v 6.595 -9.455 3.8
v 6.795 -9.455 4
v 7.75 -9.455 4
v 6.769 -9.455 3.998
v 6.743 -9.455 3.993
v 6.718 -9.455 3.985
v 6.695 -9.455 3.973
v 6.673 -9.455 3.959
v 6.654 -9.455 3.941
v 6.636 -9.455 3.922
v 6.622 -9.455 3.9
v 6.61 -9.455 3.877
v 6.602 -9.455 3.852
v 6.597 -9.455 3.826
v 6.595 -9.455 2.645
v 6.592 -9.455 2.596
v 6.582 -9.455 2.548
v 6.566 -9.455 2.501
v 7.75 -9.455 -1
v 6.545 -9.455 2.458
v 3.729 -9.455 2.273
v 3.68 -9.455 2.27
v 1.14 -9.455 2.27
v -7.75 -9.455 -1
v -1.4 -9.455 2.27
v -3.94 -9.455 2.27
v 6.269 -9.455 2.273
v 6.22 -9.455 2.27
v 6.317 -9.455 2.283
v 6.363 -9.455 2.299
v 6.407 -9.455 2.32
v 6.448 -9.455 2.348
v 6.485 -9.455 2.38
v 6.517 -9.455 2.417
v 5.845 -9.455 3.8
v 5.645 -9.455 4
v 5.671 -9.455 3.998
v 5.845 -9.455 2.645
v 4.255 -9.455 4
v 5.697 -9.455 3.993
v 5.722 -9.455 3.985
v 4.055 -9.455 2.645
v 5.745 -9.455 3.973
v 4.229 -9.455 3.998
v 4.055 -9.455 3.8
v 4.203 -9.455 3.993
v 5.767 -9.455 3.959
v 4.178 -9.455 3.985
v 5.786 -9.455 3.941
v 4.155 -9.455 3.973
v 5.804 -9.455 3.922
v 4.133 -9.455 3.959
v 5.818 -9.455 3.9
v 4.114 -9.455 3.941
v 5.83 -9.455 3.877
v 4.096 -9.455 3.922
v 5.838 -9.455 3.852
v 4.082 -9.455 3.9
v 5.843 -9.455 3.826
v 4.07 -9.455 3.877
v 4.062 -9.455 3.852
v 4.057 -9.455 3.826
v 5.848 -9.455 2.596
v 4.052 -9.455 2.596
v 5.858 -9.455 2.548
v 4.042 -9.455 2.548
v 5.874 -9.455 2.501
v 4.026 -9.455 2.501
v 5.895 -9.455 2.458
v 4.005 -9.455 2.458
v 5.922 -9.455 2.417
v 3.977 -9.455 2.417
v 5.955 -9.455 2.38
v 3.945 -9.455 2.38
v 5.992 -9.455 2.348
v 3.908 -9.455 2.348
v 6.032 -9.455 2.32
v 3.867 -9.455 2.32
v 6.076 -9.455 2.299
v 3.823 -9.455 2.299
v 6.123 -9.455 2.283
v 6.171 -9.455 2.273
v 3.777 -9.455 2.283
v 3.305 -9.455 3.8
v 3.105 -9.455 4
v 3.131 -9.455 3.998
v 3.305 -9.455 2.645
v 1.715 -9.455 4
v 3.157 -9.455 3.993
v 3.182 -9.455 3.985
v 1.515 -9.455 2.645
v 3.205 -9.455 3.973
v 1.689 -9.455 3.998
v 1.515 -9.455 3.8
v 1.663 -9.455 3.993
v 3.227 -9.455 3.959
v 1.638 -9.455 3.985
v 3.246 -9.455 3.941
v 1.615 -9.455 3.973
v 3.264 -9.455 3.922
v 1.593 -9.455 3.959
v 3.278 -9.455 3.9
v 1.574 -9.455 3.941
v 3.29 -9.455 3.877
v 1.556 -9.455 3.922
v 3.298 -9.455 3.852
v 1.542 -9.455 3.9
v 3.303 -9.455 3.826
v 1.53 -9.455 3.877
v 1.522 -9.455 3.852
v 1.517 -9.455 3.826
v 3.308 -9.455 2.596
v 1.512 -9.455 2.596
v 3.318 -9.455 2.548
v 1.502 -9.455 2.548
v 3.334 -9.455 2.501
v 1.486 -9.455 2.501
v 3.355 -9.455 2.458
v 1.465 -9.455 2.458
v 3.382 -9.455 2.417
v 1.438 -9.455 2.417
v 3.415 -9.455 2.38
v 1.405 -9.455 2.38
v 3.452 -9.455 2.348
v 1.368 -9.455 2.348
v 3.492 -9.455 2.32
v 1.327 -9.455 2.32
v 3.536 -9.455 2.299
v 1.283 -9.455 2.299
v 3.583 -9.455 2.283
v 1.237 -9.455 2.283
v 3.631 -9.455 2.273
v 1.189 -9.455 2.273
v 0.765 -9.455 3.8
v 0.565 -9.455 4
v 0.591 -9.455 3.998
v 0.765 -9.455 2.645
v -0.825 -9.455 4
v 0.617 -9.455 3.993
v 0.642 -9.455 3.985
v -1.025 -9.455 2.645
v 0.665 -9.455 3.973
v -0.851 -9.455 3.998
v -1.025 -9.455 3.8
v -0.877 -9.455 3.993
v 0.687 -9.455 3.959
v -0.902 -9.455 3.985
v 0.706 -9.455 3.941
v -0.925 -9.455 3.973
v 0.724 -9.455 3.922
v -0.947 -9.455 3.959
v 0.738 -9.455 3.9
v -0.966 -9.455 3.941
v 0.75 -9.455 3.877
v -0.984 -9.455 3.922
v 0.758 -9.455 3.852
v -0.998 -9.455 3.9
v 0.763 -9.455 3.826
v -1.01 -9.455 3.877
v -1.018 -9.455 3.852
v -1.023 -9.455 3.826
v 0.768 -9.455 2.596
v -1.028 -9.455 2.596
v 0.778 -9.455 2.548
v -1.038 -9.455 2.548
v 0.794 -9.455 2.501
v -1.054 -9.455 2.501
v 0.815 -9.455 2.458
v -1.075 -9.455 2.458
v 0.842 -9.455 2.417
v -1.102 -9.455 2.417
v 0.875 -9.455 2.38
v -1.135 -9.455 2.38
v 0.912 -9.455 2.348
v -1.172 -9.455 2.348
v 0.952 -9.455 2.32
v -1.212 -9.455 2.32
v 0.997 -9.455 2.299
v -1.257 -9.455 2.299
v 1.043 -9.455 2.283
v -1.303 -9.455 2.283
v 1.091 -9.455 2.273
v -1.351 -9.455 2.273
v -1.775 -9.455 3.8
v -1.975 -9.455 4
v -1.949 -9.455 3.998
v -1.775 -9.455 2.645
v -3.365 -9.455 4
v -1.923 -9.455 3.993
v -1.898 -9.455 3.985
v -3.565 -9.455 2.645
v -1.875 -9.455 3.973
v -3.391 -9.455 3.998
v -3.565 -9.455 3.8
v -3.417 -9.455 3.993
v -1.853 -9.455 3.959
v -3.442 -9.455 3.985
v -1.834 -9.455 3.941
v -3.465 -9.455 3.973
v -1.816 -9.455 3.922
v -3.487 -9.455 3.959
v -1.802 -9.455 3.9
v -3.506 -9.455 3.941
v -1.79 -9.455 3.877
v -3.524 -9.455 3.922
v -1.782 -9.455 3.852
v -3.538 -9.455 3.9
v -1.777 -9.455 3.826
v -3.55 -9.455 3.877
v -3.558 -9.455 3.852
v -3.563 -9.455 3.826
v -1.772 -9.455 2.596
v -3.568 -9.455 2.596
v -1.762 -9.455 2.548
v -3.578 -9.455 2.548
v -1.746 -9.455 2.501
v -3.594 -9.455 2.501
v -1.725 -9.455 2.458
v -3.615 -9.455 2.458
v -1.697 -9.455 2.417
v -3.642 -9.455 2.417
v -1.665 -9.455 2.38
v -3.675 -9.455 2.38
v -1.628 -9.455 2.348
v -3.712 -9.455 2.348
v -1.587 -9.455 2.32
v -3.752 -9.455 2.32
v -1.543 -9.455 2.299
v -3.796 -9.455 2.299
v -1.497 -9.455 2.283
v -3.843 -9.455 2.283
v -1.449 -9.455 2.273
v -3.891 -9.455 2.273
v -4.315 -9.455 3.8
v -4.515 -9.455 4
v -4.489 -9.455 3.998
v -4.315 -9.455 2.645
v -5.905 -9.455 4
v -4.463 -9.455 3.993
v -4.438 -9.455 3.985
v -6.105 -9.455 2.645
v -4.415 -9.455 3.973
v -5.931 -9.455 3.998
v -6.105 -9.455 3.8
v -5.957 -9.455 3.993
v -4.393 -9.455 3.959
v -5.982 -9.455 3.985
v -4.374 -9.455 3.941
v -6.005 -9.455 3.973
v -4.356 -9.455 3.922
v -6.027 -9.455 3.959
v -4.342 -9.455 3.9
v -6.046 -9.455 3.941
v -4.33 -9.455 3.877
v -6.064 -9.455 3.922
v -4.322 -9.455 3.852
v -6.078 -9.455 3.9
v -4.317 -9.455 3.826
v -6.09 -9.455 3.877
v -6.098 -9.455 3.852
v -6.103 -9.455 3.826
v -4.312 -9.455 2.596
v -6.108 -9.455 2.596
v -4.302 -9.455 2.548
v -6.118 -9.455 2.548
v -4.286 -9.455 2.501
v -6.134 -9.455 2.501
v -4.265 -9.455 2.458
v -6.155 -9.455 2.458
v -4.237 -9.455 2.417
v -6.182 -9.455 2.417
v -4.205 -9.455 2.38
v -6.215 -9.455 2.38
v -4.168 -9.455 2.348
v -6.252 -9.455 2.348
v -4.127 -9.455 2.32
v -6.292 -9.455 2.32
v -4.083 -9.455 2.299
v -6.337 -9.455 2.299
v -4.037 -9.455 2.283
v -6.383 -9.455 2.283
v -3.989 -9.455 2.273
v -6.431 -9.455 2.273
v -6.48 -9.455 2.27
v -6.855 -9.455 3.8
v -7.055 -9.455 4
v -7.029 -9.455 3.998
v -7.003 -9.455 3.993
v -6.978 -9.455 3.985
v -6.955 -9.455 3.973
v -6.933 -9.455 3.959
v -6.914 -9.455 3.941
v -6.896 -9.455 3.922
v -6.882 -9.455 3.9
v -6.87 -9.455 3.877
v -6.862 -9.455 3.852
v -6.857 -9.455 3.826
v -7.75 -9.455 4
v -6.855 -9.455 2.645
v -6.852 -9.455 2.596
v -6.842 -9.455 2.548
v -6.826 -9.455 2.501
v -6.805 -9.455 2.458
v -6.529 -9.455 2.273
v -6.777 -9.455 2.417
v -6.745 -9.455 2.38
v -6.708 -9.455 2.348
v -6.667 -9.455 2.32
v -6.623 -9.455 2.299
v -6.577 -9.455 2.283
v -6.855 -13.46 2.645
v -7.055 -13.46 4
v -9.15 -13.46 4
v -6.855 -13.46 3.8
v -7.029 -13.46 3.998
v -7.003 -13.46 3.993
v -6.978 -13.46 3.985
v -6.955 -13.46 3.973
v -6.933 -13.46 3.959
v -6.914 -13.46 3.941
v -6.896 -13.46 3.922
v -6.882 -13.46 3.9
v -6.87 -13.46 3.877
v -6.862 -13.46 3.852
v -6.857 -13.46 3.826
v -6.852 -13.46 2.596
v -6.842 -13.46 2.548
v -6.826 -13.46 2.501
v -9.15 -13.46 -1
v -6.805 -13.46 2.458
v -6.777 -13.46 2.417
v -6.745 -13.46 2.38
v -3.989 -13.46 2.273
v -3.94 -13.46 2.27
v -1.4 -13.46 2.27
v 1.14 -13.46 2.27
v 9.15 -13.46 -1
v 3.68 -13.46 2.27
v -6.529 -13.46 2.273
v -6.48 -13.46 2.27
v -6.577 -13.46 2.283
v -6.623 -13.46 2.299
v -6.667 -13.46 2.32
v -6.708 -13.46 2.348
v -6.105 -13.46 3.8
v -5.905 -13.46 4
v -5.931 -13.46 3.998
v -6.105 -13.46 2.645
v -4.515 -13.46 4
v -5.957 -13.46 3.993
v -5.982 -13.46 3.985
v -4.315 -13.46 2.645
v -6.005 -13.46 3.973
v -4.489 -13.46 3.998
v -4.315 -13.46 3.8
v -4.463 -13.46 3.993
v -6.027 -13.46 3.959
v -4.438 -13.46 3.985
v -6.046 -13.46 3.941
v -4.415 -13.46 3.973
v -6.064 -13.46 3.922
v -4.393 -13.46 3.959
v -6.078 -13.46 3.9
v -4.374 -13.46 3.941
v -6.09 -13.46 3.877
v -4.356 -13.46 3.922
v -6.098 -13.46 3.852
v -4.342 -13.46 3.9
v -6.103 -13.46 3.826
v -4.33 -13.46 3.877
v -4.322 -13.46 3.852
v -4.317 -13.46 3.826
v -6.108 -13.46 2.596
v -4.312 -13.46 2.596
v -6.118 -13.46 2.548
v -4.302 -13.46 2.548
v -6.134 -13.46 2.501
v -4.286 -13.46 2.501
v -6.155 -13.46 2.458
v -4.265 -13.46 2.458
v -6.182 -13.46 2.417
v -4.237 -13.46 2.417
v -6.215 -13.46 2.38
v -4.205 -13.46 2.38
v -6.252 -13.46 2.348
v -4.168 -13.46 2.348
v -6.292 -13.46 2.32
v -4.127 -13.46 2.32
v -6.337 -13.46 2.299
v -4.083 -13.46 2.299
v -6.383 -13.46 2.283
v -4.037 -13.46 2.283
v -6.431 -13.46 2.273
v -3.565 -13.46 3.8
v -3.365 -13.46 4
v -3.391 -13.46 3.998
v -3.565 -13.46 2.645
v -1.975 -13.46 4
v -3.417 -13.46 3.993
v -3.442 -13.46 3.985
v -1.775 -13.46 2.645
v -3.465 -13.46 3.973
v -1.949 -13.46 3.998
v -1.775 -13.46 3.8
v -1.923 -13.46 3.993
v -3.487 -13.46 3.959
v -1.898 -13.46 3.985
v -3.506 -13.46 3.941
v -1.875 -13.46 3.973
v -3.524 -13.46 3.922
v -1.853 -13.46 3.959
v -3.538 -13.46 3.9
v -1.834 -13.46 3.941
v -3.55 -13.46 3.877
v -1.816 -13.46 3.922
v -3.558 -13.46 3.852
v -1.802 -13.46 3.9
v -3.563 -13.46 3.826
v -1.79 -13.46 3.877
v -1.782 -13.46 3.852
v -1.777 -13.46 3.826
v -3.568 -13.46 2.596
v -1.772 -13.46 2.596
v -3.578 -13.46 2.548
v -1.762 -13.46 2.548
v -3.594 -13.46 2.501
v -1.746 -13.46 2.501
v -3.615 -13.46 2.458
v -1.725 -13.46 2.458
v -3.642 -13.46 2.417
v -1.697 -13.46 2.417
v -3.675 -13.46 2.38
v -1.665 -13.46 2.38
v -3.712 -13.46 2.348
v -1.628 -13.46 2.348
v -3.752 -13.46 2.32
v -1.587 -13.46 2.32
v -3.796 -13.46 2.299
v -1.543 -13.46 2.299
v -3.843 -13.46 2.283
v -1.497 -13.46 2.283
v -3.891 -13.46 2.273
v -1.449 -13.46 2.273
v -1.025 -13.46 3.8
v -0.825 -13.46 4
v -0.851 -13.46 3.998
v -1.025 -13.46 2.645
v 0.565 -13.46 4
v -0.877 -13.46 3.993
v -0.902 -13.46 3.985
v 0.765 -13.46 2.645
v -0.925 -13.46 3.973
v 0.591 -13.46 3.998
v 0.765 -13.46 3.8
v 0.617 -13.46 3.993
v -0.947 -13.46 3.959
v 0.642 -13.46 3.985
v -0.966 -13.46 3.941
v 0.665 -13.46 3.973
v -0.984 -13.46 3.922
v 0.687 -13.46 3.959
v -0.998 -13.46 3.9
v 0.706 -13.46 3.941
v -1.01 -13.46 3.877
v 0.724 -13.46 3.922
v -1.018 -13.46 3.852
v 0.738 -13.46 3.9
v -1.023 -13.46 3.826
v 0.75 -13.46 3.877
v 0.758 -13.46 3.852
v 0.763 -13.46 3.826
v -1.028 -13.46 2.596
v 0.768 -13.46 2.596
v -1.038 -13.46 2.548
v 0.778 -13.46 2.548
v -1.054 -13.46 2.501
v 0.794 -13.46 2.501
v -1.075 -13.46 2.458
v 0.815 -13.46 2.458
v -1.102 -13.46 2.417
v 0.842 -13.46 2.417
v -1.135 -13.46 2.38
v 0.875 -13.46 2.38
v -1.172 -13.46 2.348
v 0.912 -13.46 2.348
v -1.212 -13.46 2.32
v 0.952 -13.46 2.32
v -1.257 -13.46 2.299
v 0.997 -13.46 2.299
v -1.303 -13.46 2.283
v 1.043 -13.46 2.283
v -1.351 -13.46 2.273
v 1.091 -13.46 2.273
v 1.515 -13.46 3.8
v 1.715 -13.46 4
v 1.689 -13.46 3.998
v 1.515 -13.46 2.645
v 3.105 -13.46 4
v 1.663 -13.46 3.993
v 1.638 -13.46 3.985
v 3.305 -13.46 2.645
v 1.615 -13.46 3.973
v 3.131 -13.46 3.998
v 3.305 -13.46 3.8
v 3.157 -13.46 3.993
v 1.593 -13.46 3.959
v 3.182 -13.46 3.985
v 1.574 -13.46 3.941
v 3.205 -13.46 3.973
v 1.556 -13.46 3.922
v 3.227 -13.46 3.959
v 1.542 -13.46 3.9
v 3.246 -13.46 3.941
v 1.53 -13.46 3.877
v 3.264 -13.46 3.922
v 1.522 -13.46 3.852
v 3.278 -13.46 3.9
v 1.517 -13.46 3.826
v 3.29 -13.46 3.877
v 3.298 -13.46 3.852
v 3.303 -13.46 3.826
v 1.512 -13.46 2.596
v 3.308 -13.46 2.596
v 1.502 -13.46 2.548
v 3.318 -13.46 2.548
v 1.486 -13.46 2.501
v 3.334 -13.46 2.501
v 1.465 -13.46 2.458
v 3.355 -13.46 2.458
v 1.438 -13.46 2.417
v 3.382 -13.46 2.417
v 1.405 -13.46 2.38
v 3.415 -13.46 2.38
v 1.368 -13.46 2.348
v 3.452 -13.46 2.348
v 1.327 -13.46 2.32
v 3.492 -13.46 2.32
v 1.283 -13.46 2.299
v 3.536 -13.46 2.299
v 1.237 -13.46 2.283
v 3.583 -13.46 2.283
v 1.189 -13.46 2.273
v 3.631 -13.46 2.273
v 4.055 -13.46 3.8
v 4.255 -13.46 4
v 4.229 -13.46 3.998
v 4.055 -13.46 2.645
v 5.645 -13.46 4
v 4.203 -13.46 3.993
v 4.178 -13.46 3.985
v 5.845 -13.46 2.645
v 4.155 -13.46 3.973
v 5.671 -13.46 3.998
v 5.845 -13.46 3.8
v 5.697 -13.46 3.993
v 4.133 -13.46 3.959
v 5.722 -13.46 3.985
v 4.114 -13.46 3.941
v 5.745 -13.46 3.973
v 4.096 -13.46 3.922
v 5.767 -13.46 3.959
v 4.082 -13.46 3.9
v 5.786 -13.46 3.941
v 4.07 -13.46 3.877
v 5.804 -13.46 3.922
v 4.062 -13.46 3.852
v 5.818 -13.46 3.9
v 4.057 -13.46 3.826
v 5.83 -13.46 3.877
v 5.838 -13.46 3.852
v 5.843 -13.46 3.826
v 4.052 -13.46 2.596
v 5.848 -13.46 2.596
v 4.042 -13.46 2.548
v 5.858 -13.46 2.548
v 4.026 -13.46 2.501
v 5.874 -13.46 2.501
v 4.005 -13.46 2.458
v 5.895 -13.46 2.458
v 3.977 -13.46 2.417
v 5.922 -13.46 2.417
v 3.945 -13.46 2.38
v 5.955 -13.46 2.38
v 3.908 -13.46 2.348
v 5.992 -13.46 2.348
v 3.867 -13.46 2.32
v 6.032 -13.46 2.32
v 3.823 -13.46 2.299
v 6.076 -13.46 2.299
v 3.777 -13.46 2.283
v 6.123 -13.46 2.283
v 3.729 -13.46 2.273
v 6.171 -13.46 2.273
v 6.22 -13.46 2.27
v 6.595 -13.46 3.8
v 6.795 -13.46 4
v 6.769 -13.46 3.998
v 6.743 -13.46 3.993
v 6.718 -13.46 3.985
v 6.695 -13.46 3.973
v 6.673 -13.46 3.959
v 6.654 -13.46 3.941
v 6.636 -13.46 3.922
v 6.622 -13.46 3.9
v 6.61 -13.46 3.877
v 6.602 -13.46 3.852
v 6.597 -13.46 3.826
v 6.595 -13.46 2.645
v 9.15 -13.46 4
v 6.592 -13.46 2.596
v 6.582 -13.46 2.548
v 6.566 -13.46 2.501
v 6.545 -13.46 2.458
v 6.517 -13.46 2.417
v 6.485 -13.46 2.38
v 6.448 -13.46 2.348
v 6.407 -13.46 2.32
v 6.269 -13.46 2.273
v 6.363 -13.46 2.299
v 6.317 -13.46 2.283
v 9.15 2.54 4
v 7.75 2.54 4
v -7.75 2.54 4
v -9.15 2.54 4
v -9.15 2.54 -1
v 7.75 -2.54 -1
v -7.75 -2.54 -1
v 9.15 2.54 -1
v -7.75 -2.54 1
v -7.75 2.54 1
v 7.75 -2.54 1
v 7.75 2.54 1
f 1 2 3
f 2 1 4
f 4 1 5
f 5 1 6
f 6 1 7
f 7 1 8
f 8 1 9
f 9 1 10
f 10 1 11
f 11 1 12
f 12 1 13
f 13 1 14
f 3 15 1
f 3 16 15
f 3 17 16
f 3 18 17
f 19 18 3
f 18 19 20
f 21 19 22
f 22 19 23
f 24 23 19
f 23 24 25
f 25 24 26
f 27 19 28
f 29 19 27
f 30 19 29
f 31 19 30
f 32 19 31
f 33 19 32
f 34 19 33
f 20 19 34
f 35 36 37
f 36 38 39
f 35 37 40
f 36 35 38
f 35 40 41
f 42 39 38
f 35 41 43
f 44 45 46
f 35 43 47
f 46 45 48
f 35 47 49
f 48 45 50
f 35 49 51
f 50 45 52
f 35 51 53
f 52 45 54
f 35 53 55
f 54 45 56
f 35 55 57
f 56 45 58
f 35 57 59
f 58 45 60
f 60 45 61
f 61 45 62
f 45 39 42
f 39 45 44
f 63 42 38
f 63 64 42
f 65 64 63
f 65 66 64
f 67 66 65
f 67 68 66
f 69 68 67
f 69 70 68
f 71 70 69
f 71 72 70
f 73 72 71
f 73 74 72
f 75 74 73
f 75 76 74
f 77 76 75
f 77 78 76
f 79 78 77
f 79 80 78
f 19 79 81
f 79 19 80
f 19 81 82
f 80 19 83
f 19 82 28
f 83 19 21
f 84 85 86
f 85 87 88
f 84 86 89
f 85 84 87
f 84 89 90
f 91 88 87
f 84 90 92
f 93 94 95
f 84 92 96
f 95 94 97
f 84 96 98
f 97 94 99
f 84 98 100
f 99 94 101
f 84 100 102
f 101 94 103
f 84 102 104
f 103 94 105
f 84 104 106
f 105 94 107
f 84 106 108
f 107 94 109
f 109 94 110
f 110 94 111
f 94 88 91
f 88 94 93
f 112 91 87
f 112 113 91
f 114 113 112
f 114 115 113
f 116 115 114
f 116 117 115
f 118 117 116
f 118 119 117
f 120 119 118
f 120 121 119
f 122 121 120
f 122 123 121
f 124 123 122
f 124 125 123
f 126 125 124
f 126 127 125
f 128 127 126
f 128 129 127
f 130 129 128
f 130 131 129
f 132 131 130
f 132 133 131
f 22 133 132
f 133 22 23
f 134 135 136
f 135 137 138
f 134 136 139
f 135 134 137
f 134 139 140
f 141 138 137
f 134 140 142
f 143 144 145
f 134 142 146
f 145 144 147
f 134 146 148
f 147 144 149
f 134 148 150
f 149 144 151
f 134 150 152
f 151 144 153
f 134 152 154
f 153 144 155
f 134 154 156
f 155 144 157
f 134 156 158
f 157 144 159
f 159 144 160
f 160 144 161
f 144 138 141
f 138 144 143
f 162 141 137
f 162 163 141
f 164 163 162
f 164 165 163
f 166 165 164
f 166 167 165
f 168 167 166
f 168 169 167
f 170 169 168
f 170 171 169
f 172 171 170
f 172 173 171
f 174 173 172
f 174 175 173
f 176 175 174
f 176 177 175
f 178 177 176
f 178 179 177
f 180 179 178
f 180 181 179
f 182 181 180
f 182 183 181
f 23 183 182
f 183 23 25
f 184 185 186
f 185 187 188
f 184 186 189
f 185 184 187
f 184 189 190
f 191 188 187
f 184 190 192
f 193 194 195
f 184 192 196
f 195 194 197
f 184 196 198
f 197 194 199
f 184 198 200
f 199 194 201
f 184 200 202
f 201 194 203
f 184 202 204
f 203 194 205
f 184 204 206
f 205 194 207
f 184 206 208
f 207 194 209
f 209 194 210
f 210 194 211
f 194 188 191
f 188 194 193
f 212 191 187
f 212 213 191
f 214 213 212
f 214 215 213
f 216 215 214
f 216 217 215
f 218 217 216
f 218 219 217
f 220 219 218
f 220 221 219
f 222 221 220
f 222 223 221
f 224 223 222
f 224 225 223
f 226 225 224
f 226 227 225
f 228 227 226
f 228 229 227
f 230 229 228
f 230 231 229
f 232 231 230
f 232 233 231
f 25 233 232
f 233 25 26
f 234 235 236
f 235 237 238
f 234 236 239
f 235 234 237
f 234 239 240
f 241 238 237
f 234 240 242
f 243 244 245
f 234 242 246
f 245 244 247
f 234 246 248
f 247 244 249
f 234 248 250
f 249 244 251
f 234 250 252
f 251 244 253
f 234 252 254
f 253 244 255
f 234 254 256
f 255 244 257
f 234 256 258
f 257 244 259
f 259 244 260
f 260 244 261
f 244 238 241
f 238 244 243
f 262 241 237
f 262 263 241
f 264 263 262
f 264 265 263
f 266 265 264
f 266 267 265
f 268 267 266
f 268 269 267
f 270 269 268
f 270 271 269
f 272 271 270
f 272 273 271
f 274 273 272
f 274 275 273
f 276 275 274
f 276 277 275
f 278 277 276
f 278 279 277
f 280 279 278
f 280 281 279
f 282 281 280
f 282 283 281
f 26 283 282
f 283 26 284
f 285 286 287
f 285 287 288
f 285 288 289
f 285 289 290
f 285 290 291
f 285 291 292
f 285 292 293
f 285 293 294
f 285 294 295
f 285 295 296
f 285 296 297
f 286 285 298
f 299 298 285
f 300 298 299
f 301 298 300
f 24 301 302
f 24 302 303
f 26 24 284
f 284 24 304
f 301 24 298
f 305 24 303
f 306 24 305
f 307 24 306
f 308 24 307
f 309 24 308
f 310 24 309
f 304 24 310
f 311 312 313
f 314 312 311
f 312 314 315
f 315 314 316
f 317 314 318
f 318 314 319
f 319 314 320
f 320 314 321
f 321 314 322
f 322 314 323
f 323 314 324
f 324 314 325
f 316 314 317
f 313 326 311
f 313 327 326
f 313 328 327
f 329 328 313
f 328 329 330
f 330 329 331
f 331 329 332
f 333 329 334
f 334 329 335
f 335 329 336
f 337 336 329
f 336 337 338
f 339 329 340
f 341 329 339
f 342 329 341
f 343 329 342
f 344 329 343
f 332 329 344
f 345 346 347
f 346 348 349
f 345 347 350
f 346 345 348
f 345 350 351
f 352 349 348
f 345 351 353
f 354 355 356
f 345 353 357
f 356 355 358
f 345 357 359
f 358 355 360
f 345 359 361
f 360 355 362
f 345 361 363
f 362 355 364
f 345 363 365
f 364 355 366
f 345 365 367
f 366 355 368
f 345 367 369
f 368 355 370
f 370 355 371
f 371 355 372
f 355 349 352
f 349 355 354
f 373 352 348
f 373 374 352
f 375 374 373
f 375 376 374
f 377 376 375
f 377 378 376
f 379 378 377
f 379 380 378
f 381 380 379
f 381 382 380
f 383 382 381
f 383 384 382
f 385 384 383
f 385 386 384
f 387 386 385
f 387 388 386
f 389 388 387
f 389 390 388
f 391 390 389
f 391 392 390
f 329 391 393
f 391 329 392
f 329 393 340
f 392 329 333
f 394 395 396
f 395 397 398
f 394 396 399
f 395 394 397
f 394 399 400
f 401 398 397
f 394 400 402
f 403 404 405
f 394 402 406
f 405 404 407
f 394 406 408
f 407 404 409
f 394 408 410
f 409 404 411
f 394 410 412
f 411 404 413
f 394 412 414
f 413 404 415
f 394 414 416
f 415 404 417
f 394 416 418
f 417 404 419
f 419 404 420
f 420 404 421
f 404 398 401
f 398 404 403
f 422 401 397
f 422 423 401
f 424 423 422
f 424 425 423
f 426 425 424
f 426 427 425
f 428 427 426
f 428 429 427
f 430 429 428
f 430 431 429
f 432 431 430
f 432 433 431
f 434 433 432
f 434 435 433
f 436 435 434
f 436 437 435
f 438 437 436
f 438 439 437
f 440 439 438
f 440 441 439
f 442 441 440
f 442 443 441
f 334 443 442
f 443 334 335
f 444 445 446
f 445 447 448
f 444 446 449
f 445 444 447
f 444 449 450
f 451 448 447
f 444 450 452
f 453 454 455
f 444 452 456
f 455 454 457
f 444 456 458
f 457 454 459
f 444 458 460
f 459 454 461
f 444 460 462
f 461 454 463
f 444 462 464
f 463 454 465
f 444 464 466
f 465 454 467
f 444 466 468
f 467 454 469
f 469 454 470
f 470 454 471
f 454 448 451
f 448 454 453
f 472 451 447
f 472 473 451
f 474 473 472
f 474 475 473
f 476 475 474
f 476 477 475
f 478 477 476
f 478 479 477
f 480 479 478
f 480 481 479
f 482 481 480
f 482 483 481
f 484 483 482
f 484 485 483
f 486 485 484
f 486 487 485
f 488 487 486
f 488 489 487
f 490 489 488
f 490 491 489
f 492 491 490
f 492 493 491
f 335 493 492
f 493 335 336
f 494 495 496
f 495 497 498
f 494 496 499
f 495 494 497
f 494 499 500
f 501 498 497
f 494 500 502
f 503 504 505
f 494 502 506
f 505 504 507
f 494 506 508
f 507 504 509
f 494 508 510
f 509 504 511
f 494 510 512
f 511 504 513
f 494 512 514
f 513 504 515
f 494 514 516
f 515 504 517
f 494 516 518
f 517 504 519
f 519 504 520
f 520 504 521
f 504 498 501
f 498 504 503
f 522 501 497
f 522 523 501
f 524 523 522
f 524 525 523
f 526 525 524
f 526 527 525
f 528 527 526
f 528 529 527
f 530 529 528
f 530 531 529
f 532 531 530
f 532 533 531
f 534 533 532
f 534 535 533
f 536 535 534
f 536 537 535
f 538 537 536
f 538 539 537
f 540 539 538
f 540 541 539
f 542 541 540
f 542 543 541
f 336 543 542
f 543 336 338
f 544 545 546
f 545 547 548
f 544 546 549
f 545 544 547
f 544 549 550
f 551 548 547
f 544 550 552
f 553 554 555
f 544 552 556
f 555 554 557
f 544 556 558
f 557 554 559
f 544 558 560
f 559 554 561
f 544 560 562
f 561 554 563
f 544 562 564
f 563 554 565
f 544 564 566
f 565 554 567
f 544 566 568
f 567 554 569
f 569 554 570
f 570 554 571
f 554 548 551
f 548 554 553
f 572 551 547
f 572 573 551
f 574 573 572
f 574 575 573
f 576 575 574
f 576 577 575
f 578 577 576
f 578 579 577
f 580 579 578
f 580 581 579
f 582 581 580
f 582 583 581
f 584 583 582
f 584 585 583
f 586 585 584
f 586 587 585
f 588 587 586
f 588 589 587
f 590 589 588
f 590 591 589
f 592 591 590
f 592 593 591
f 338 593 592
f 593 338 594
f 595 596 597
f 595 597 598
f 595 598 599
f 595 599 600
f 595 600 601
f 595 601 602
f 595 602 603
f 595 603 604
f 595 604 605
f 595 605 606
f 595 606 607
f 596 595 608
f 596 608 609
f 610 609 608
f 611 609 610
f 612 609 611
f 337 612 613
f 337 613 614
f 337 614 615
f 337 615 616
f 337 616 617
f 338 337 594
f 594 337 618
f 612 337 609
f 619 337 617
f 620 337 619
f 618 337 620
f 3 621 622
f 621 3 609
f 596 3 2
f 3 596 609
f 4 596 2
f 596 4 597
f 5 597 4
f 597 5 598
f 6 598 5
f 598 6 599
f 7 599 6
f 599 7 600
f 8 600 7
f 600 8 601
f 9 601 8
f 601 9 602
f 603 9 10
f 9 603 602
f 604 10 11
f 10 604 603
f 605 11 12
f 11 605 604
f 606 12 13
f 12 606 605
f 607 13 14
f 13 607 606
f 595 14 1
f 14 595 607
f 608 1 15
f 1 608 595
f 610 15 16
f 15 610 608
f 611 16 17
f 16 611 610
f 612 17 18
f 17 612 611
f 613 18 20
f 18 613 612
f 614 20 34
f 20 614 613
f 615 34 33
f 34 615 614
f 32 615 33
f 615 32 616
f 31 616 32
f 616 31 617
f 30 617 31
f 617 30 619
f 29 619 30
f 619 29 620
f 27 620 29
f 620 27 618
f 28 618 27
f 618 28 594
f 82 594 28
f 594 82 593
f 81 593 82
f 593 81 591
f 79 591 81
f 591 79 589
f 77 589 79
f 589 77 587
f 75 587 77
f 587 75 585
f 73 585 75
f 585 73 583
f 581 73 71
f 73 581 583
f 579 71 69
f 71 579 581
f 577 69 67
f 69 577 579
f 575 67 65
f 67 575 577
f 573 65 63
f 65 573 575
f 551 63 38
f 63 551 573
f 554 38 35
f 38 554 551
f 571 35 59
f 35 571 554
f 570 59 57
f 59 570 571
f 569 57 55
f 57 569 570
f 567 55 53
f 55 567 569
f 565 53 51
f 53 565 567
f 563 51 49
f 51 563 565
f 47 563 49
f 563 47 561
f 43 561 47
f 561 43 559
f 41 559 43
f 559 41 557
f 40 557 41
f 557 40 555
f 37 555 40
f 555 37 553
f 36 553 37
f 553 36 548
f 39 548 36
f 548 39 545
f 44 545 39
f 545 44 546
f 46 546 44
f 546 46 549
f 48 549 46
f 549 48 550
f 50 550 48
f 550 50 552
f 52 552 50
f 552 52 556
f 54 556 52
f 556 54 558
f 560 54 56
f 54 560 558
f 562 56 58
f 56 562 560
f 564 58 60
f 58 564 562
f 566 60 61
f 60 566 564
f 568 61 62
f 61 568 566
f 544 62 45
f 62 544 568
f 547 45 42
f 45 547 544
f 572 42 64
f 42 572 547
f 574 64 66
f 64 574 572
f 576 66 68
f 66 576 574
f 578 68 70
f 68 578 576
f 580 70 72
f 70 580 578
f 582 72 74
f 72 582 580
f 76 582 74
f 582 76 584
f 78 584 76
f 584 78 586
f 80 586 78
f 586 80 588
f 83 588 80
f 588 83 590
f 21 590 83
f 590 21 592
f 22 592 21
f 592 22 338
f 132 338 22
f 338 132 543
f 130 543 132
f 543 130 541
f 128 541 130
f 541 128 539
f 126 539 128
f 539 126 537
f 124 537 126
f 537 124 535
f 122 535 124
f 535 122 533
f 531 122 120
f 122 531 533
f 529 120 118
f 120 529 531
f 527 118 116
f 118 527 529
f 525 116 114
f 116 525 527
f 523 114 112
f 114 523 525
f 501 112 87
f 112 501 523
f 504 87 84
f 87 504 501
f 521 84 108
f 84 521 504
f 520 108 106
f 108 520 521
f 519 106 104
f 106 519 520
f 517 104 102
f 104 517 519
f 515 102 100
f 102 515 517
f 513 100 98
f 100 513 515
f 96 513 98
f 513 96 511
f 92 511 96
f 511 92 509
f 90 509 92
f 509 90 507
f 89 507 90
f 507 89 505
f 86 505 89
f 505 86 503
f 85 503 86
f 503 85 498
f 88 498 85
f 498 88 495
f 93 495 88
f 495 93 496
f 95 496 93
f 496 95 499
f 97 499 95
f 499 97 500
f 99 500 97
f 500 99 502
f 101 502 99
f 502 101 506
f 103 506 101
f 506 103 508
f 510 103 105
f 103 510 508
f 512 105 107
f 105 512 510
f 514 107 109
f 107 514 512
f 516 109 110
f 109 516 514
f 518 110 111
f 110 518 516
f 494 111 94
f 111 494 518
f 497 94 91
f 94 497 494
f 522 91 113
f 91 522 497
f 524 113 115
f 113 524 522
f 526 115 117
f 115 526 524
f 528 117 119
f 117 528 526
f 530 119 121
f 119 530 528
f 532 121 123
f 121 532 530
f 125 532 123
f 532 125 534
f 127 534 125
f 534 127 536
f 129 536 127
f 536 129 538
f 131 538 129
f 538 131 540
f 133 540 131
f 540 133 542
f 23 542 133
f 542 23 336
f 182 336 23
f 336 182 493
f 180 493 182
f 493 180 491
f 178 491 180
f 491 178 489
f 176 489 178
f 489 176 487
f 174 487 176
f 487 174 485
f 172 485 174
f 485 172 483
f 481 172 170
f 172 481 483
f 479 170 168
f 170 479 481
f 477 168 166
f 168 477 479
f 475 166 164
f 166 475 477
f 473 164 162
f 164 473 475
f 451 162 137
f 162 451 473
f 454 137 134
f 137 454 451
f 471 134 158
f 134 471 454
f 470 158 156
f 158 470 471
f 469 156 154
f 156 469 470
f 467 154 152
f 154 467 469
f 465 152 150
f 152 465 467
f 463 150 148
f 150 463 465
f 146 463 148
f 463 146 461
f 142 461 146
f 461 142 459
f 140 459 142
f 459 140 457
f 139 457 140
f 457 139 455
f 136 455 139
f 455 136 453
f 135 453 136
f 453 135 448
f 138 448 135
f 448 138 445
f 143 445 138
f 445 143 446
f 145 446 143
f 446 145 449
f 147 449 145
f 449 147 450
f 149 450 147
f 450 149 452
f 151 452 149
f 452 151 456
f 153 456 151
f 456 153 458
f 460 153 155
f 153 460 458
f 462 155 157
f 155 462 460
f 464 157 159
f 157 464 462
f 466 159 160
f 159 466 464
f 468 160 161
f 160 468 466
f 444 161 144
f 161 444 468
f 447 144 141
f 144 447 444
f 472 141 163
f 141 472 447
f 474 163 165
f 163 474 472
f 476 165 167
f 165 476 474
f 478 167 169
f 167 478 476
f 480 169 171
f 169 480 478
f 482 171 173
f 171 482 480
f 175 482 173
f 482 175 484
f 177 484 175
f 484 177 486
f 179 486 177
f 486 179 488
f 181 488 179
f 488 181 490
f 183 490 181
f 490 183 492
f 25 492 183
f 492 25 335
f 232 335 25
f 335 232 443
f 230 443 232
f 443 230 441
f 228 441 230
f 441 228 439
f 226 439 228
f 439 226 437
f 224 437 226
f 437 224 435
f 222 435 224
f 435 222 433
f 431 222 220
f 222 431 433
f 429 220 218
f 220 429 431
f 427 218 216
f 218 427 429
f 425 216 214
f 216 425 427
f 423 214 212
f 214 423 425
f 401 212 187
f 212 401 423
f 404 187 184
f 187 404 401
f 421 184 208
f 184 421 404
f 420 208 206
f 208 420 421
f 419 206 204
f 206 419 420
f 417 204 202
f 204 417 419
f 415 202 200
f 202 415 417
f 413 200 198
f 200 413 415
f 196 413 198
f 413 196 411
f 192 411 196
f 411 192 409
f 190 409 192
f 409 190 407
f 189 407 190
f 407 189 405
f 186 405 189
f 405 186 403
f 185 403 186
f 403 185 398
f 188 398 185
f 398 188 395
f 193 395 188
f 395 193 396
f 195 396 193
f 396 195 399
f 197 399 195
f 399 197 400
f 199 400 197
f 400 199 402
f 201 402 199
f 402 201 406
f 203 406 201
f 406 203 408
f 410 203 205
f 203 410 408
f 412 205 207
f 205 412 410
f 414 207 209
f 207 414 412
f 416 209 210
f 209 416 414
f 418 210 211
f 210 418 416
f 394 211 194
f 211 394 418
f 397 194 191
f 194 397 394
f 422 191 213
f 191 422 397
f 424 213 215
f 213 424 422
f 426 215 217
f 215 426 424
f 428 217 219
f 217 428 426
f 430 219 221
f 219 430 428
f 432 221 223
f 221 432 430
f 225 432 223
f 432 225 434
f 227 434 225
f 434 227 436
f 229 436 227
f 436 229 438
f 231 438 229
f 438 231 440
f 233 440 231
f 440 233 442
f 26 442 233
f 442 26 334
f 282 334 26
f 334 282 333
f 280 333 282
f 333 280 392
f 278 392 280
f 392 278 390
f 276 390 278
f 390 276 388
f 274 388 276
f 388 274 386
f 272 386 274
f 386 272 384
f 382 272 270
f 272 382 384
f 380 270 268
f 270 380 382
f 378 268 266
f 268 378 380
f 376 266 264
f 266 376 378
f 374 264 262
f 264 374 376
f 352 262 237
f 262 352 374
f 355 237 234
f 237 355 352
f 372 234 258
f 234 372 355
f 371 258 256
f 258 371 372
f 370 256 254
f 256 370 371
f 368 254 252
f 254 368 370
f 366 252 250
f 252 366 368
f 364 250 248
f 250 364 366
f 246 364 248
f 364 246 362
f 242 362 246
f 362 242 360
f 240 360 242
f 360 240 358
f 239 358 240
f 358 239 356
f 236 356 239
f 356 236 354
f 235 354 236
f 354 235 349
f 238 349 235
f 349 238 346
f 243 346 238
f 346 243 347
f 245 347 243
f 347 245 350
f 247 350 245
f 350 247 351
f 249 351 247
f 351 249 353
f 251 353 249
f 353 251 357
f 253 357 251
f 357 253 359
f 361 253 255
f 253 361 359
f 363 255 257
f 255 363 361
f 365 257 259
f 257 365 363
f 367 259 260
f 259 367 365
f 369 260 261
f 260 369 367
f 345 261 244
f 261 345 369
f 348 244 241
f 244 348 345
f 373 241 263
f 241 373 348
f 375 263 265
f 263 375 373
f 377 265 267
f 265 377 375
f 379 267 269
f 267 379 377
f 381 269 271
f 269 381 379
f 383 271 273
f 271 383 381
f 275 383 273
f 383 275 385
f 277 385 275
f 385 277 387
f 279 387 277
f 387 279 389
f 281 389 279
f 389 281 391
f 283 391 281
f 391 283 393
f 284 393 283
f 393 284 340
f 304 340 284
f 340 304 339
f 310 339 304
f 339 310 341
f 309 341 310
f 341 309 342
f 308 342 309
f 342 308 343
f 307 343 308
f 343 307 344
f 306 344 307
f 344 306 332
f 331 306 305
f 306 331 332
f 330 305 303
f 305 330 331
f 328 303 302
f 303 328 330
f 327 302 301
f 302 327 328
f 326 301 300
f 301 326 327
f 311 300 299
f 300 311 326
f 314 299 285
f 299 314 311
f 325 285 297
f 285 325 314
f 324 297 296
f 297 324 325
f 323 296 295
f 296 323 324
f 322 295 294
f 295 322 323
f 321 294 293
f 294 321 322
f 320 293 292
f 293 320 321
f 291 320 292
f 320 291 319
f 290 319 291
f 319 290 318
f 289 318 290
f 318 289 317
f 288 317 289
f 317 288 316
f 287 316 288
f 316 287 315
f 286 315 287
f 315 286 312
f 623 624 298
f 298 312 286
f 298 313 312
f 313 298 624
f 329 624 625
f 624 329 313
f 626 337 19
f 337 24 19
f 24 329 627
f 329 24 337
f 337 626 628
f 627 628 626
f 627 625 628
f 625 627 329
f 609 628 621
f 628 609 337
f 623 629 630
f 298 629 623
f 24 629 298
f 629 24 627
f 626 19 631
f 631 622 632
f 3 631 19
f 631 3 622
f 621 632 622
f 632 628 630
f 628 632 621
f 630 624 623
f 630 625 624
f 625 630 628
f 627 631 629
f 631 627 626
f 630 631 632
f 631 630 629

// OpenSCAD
// file: lead_groove.scad
// The lead groove of the two solder jigs, shared by both.
//
//     830-001_SolderJig6PinHolder.scad   six grooves down from the front block's top, one per pin
//     830-002_SolderJigLEDRig.scad       two per LED, up from the lip's underside, one per lead
//
// A groove is 0.750 wide with a round end, and its mouth's two edges are rounded R0.2. Measured on
// both references (scadmesh arcs across the grooves): the walls 0.750 apart and the mouth rounds
// R0.200 on each; the round end, on a coarse tessellation, reads as one arc of about R0.4 whose ends
// sit on the walls.
//
// Included, not used, so that its constants reach the including file.

LEAD_GROOVE_W = 0.750;   // across the walls
LEAD_GROOVE_R = 0.200;   // the mouth's rounds

// One groove's cutter in 2D, its mouth on y = 0 centred on x = 0, `depth` deep along +y to the end
// of its round. It reaches 1 below the mouth, so it cuts through the face it opens in.
module lead_groove_2d(depth) {
    w = LEAD_GROOVE_W;
    r = LEAD_GROOVE_R;
    translate([-w / 2, -1]) square([w, depth - w / 2 + 1]);
    translate([0, depth - w / 2]) circle(d = w);
    for (s = [-1, 1]) scale([s, 1]) difference() {
        translate([w / 2 - 0.01, -1]) square([r + 0.01, r + 1]);
        translate([w / 2 + r, r]) circle(r = r);
    }
}
// file: ../print_fit.scad
// Print-fit clearances, shared by every printed part's `config="revised"`.
//
// A printed part comes off the machine slightly oversize, so a feature drawn
// line-to-line against what it mates with will not go together. Each mating
// feature is drawn at its mate's nominal size plus or minus one of two
// clearances, per side, chosen by what the mate is:
//
//     FIT_PRESS    a bought part the printed one is seated on, located by
//                  or bonded to: bearings, motors, splines, CF rods, tubes
//                  and strakes
//     FIT_SLIP     another printed part, and every fastener's clearance:
//                  screw holes, nut traps and pockets
//
// A third class is not a fit, because its surfaces never meet:
//
//     FIT_RUN      a gap between two parts that turn past each other and
//                  must never touch, such as a housing and a gear's teeth
//
// A fourth class is drawn under its mate's size, not over it:
//
//     FIT_TAP      a pilot a screw cuts its own thread into, drawn as
//                  fit_pin(the screw's nominal, FIT_TAP)
//
// The classes, their members and exclusions, and how a machine is qualified
// against these values are owned by specs/007.2 § Print fits; the coupon that
// qualifies them is 950-Tooling/fit_coupon.scad.
//
// Every part `include`s this file, so `-D FIT_SLIP=...` reaches a single
// render, and an edit here retunes every part. `config="previous"` draws at
// zero clearance: it is the reference mesh, and its dist gate measures it.

FIT_SLIP  = 0.15;
FIT_PRESS = 0.05;
FIT_RUN   = 0.50;
FIT_TAP   = 0.20;

// A hole or bore that takes a mate of diameter d, and a pin or shaft that
// goes into one, with clearance c per side.
function fit_bore(d, c) = d + 2 * c;
function fit_pin(d, c) = d - 2 * c;

// The clearances a part draws in configuration cfg: [slip, press, run, tap].
function fit_clearances(cfg) =
    cfg == "previous" ? [0, 0, 0, 0] : [FIT_SLIP, FIT_PRESS, FIT_RUN, FIT_TAP];
// main file
// #830-001 Solder Jig — 6-pin holder — parametric source.
// Holds a 6-pin header (2.54 mm pitch) for soldering: each pin lies in a lead groove across the front
// block, and the side walls and the back bar frame the board (specs/007.2 § Tooling — solder jigs).
//
//   config = "previous" — a faithful recreation of the reference mesh
//                         (../Reference/meshes/950-Tooling/), in that mesh's frame.
//   config = "revised"  — the same part; see FITS.
//
// FRAME. The reference's own: z -1 .. 4, the back face on y 2.54 and the front face on y -13.46.
//
// CONSTRUCTION. A section in (x, z), extruded along +Y, in three layers:
//
//     front block   y -13.46 .. -9.46   F1 - 6 x G1
//     walls         y -9.46 .. -2.54    the two side walls W1
//     back          y -2.54 .. 2.54     W1 + the back bar B1
//
// `layer = "front"`, `"walls"` or `"back"` draws that section in 2D, for verification against the
// mesh's section across y (render.rs --verify does this).
//
// Measured from the reference with scadmesh planes/slice/arcs/solid (sections across x, y and z):
//
//     ID  feature        value
//     F1  front block    |x| <= 9.15, z -1 .. 4
//     G1  lead grooves   6 on x = -6.48 + 2.54 k, down from z 4 to their round end at z 2.27
//                        (lead_groove.scad)
//     W1  side walls     |x| 7.75 .. 9.15, z -1 .. 4
//     B1  back bar       |x| <= 9.15, z -1 .. 1
//
// FITS: none drawn. The grooves hold a bought header's pins, a locating rest rather than a fit, so
// `revised` is `previous`.

include <../print_fit.scad>
include <lead_groove.scad>

/* [Configuration] */
// Parameter set: previous (reference) or revised
config = "previous"; // [previous, revised]
// What to draw: the part, or one section in 2D
layer = "part"; // [part, front, walls, back]

/* [Hidden] */
$fn = 48;
SEAM_LAP = 0.005;   // each layer runs this far into the next, so no two faces coincide

HALF_W  = 9.150;                   // F1, W1, B1
WALL_IN = 7.750;                   // W1's inner faces
Z       = [-1.000, 4.000];         // F1, W1
BAR_TOP = 1.000;                   // B1
Y       = [-13.460, -9.460, -2.540, 2.540];   // the layers' bounds
GROOVES = [6, -6.480, 2.540];      // G1: count, first centre, pitch
GROOVE_END = 2.270;

module walls_2d() for (s = [-1, 1]) scale([s, 1]) translate([WALL_IN, Z[0]]) square([HALF_W - WALL_IN, Z[1] - Z[0]]);

module front_2d()
    difference() {
        translate([-HALF_W, Z[0]]) square([2 * HALF_W, Z[1] - Z[0]]);
        for (k = [0 : GROOVES[0] - 1])
            translate([GROOVES[1] + k * GROOVES[2], Z[1]]) scale([1, -1]) lead_groove_2d(Z[1] - GROOVE_END);
    }

module back_2d() { walls_2d(); translate([-HALF_W, Z[0]]) square([2 * HALF_W, BAR_TOP - Z[0]]); }

// A section laid in the XZ plane and extruded along +Y from y0 to y1.
module run(y0, y1) translate([0, y1, 0]) rotate([90, 0, 0]) linear_extrude(y1 - y0) children();

module solder_jig_6pin() {
    run(Y[0], Y[1] + SEAM_LAP) front_2d();
    run(Y[1], Y[2] + SEAM_LAP) walls_2d();
    run(Y[2], Y[3]) back_2d();
}

if (layer == "front") front_2d();
else if (layer == "walls") walls_2d();
else if (layer == "back") back_2d();
else solder_jig_6pin();
